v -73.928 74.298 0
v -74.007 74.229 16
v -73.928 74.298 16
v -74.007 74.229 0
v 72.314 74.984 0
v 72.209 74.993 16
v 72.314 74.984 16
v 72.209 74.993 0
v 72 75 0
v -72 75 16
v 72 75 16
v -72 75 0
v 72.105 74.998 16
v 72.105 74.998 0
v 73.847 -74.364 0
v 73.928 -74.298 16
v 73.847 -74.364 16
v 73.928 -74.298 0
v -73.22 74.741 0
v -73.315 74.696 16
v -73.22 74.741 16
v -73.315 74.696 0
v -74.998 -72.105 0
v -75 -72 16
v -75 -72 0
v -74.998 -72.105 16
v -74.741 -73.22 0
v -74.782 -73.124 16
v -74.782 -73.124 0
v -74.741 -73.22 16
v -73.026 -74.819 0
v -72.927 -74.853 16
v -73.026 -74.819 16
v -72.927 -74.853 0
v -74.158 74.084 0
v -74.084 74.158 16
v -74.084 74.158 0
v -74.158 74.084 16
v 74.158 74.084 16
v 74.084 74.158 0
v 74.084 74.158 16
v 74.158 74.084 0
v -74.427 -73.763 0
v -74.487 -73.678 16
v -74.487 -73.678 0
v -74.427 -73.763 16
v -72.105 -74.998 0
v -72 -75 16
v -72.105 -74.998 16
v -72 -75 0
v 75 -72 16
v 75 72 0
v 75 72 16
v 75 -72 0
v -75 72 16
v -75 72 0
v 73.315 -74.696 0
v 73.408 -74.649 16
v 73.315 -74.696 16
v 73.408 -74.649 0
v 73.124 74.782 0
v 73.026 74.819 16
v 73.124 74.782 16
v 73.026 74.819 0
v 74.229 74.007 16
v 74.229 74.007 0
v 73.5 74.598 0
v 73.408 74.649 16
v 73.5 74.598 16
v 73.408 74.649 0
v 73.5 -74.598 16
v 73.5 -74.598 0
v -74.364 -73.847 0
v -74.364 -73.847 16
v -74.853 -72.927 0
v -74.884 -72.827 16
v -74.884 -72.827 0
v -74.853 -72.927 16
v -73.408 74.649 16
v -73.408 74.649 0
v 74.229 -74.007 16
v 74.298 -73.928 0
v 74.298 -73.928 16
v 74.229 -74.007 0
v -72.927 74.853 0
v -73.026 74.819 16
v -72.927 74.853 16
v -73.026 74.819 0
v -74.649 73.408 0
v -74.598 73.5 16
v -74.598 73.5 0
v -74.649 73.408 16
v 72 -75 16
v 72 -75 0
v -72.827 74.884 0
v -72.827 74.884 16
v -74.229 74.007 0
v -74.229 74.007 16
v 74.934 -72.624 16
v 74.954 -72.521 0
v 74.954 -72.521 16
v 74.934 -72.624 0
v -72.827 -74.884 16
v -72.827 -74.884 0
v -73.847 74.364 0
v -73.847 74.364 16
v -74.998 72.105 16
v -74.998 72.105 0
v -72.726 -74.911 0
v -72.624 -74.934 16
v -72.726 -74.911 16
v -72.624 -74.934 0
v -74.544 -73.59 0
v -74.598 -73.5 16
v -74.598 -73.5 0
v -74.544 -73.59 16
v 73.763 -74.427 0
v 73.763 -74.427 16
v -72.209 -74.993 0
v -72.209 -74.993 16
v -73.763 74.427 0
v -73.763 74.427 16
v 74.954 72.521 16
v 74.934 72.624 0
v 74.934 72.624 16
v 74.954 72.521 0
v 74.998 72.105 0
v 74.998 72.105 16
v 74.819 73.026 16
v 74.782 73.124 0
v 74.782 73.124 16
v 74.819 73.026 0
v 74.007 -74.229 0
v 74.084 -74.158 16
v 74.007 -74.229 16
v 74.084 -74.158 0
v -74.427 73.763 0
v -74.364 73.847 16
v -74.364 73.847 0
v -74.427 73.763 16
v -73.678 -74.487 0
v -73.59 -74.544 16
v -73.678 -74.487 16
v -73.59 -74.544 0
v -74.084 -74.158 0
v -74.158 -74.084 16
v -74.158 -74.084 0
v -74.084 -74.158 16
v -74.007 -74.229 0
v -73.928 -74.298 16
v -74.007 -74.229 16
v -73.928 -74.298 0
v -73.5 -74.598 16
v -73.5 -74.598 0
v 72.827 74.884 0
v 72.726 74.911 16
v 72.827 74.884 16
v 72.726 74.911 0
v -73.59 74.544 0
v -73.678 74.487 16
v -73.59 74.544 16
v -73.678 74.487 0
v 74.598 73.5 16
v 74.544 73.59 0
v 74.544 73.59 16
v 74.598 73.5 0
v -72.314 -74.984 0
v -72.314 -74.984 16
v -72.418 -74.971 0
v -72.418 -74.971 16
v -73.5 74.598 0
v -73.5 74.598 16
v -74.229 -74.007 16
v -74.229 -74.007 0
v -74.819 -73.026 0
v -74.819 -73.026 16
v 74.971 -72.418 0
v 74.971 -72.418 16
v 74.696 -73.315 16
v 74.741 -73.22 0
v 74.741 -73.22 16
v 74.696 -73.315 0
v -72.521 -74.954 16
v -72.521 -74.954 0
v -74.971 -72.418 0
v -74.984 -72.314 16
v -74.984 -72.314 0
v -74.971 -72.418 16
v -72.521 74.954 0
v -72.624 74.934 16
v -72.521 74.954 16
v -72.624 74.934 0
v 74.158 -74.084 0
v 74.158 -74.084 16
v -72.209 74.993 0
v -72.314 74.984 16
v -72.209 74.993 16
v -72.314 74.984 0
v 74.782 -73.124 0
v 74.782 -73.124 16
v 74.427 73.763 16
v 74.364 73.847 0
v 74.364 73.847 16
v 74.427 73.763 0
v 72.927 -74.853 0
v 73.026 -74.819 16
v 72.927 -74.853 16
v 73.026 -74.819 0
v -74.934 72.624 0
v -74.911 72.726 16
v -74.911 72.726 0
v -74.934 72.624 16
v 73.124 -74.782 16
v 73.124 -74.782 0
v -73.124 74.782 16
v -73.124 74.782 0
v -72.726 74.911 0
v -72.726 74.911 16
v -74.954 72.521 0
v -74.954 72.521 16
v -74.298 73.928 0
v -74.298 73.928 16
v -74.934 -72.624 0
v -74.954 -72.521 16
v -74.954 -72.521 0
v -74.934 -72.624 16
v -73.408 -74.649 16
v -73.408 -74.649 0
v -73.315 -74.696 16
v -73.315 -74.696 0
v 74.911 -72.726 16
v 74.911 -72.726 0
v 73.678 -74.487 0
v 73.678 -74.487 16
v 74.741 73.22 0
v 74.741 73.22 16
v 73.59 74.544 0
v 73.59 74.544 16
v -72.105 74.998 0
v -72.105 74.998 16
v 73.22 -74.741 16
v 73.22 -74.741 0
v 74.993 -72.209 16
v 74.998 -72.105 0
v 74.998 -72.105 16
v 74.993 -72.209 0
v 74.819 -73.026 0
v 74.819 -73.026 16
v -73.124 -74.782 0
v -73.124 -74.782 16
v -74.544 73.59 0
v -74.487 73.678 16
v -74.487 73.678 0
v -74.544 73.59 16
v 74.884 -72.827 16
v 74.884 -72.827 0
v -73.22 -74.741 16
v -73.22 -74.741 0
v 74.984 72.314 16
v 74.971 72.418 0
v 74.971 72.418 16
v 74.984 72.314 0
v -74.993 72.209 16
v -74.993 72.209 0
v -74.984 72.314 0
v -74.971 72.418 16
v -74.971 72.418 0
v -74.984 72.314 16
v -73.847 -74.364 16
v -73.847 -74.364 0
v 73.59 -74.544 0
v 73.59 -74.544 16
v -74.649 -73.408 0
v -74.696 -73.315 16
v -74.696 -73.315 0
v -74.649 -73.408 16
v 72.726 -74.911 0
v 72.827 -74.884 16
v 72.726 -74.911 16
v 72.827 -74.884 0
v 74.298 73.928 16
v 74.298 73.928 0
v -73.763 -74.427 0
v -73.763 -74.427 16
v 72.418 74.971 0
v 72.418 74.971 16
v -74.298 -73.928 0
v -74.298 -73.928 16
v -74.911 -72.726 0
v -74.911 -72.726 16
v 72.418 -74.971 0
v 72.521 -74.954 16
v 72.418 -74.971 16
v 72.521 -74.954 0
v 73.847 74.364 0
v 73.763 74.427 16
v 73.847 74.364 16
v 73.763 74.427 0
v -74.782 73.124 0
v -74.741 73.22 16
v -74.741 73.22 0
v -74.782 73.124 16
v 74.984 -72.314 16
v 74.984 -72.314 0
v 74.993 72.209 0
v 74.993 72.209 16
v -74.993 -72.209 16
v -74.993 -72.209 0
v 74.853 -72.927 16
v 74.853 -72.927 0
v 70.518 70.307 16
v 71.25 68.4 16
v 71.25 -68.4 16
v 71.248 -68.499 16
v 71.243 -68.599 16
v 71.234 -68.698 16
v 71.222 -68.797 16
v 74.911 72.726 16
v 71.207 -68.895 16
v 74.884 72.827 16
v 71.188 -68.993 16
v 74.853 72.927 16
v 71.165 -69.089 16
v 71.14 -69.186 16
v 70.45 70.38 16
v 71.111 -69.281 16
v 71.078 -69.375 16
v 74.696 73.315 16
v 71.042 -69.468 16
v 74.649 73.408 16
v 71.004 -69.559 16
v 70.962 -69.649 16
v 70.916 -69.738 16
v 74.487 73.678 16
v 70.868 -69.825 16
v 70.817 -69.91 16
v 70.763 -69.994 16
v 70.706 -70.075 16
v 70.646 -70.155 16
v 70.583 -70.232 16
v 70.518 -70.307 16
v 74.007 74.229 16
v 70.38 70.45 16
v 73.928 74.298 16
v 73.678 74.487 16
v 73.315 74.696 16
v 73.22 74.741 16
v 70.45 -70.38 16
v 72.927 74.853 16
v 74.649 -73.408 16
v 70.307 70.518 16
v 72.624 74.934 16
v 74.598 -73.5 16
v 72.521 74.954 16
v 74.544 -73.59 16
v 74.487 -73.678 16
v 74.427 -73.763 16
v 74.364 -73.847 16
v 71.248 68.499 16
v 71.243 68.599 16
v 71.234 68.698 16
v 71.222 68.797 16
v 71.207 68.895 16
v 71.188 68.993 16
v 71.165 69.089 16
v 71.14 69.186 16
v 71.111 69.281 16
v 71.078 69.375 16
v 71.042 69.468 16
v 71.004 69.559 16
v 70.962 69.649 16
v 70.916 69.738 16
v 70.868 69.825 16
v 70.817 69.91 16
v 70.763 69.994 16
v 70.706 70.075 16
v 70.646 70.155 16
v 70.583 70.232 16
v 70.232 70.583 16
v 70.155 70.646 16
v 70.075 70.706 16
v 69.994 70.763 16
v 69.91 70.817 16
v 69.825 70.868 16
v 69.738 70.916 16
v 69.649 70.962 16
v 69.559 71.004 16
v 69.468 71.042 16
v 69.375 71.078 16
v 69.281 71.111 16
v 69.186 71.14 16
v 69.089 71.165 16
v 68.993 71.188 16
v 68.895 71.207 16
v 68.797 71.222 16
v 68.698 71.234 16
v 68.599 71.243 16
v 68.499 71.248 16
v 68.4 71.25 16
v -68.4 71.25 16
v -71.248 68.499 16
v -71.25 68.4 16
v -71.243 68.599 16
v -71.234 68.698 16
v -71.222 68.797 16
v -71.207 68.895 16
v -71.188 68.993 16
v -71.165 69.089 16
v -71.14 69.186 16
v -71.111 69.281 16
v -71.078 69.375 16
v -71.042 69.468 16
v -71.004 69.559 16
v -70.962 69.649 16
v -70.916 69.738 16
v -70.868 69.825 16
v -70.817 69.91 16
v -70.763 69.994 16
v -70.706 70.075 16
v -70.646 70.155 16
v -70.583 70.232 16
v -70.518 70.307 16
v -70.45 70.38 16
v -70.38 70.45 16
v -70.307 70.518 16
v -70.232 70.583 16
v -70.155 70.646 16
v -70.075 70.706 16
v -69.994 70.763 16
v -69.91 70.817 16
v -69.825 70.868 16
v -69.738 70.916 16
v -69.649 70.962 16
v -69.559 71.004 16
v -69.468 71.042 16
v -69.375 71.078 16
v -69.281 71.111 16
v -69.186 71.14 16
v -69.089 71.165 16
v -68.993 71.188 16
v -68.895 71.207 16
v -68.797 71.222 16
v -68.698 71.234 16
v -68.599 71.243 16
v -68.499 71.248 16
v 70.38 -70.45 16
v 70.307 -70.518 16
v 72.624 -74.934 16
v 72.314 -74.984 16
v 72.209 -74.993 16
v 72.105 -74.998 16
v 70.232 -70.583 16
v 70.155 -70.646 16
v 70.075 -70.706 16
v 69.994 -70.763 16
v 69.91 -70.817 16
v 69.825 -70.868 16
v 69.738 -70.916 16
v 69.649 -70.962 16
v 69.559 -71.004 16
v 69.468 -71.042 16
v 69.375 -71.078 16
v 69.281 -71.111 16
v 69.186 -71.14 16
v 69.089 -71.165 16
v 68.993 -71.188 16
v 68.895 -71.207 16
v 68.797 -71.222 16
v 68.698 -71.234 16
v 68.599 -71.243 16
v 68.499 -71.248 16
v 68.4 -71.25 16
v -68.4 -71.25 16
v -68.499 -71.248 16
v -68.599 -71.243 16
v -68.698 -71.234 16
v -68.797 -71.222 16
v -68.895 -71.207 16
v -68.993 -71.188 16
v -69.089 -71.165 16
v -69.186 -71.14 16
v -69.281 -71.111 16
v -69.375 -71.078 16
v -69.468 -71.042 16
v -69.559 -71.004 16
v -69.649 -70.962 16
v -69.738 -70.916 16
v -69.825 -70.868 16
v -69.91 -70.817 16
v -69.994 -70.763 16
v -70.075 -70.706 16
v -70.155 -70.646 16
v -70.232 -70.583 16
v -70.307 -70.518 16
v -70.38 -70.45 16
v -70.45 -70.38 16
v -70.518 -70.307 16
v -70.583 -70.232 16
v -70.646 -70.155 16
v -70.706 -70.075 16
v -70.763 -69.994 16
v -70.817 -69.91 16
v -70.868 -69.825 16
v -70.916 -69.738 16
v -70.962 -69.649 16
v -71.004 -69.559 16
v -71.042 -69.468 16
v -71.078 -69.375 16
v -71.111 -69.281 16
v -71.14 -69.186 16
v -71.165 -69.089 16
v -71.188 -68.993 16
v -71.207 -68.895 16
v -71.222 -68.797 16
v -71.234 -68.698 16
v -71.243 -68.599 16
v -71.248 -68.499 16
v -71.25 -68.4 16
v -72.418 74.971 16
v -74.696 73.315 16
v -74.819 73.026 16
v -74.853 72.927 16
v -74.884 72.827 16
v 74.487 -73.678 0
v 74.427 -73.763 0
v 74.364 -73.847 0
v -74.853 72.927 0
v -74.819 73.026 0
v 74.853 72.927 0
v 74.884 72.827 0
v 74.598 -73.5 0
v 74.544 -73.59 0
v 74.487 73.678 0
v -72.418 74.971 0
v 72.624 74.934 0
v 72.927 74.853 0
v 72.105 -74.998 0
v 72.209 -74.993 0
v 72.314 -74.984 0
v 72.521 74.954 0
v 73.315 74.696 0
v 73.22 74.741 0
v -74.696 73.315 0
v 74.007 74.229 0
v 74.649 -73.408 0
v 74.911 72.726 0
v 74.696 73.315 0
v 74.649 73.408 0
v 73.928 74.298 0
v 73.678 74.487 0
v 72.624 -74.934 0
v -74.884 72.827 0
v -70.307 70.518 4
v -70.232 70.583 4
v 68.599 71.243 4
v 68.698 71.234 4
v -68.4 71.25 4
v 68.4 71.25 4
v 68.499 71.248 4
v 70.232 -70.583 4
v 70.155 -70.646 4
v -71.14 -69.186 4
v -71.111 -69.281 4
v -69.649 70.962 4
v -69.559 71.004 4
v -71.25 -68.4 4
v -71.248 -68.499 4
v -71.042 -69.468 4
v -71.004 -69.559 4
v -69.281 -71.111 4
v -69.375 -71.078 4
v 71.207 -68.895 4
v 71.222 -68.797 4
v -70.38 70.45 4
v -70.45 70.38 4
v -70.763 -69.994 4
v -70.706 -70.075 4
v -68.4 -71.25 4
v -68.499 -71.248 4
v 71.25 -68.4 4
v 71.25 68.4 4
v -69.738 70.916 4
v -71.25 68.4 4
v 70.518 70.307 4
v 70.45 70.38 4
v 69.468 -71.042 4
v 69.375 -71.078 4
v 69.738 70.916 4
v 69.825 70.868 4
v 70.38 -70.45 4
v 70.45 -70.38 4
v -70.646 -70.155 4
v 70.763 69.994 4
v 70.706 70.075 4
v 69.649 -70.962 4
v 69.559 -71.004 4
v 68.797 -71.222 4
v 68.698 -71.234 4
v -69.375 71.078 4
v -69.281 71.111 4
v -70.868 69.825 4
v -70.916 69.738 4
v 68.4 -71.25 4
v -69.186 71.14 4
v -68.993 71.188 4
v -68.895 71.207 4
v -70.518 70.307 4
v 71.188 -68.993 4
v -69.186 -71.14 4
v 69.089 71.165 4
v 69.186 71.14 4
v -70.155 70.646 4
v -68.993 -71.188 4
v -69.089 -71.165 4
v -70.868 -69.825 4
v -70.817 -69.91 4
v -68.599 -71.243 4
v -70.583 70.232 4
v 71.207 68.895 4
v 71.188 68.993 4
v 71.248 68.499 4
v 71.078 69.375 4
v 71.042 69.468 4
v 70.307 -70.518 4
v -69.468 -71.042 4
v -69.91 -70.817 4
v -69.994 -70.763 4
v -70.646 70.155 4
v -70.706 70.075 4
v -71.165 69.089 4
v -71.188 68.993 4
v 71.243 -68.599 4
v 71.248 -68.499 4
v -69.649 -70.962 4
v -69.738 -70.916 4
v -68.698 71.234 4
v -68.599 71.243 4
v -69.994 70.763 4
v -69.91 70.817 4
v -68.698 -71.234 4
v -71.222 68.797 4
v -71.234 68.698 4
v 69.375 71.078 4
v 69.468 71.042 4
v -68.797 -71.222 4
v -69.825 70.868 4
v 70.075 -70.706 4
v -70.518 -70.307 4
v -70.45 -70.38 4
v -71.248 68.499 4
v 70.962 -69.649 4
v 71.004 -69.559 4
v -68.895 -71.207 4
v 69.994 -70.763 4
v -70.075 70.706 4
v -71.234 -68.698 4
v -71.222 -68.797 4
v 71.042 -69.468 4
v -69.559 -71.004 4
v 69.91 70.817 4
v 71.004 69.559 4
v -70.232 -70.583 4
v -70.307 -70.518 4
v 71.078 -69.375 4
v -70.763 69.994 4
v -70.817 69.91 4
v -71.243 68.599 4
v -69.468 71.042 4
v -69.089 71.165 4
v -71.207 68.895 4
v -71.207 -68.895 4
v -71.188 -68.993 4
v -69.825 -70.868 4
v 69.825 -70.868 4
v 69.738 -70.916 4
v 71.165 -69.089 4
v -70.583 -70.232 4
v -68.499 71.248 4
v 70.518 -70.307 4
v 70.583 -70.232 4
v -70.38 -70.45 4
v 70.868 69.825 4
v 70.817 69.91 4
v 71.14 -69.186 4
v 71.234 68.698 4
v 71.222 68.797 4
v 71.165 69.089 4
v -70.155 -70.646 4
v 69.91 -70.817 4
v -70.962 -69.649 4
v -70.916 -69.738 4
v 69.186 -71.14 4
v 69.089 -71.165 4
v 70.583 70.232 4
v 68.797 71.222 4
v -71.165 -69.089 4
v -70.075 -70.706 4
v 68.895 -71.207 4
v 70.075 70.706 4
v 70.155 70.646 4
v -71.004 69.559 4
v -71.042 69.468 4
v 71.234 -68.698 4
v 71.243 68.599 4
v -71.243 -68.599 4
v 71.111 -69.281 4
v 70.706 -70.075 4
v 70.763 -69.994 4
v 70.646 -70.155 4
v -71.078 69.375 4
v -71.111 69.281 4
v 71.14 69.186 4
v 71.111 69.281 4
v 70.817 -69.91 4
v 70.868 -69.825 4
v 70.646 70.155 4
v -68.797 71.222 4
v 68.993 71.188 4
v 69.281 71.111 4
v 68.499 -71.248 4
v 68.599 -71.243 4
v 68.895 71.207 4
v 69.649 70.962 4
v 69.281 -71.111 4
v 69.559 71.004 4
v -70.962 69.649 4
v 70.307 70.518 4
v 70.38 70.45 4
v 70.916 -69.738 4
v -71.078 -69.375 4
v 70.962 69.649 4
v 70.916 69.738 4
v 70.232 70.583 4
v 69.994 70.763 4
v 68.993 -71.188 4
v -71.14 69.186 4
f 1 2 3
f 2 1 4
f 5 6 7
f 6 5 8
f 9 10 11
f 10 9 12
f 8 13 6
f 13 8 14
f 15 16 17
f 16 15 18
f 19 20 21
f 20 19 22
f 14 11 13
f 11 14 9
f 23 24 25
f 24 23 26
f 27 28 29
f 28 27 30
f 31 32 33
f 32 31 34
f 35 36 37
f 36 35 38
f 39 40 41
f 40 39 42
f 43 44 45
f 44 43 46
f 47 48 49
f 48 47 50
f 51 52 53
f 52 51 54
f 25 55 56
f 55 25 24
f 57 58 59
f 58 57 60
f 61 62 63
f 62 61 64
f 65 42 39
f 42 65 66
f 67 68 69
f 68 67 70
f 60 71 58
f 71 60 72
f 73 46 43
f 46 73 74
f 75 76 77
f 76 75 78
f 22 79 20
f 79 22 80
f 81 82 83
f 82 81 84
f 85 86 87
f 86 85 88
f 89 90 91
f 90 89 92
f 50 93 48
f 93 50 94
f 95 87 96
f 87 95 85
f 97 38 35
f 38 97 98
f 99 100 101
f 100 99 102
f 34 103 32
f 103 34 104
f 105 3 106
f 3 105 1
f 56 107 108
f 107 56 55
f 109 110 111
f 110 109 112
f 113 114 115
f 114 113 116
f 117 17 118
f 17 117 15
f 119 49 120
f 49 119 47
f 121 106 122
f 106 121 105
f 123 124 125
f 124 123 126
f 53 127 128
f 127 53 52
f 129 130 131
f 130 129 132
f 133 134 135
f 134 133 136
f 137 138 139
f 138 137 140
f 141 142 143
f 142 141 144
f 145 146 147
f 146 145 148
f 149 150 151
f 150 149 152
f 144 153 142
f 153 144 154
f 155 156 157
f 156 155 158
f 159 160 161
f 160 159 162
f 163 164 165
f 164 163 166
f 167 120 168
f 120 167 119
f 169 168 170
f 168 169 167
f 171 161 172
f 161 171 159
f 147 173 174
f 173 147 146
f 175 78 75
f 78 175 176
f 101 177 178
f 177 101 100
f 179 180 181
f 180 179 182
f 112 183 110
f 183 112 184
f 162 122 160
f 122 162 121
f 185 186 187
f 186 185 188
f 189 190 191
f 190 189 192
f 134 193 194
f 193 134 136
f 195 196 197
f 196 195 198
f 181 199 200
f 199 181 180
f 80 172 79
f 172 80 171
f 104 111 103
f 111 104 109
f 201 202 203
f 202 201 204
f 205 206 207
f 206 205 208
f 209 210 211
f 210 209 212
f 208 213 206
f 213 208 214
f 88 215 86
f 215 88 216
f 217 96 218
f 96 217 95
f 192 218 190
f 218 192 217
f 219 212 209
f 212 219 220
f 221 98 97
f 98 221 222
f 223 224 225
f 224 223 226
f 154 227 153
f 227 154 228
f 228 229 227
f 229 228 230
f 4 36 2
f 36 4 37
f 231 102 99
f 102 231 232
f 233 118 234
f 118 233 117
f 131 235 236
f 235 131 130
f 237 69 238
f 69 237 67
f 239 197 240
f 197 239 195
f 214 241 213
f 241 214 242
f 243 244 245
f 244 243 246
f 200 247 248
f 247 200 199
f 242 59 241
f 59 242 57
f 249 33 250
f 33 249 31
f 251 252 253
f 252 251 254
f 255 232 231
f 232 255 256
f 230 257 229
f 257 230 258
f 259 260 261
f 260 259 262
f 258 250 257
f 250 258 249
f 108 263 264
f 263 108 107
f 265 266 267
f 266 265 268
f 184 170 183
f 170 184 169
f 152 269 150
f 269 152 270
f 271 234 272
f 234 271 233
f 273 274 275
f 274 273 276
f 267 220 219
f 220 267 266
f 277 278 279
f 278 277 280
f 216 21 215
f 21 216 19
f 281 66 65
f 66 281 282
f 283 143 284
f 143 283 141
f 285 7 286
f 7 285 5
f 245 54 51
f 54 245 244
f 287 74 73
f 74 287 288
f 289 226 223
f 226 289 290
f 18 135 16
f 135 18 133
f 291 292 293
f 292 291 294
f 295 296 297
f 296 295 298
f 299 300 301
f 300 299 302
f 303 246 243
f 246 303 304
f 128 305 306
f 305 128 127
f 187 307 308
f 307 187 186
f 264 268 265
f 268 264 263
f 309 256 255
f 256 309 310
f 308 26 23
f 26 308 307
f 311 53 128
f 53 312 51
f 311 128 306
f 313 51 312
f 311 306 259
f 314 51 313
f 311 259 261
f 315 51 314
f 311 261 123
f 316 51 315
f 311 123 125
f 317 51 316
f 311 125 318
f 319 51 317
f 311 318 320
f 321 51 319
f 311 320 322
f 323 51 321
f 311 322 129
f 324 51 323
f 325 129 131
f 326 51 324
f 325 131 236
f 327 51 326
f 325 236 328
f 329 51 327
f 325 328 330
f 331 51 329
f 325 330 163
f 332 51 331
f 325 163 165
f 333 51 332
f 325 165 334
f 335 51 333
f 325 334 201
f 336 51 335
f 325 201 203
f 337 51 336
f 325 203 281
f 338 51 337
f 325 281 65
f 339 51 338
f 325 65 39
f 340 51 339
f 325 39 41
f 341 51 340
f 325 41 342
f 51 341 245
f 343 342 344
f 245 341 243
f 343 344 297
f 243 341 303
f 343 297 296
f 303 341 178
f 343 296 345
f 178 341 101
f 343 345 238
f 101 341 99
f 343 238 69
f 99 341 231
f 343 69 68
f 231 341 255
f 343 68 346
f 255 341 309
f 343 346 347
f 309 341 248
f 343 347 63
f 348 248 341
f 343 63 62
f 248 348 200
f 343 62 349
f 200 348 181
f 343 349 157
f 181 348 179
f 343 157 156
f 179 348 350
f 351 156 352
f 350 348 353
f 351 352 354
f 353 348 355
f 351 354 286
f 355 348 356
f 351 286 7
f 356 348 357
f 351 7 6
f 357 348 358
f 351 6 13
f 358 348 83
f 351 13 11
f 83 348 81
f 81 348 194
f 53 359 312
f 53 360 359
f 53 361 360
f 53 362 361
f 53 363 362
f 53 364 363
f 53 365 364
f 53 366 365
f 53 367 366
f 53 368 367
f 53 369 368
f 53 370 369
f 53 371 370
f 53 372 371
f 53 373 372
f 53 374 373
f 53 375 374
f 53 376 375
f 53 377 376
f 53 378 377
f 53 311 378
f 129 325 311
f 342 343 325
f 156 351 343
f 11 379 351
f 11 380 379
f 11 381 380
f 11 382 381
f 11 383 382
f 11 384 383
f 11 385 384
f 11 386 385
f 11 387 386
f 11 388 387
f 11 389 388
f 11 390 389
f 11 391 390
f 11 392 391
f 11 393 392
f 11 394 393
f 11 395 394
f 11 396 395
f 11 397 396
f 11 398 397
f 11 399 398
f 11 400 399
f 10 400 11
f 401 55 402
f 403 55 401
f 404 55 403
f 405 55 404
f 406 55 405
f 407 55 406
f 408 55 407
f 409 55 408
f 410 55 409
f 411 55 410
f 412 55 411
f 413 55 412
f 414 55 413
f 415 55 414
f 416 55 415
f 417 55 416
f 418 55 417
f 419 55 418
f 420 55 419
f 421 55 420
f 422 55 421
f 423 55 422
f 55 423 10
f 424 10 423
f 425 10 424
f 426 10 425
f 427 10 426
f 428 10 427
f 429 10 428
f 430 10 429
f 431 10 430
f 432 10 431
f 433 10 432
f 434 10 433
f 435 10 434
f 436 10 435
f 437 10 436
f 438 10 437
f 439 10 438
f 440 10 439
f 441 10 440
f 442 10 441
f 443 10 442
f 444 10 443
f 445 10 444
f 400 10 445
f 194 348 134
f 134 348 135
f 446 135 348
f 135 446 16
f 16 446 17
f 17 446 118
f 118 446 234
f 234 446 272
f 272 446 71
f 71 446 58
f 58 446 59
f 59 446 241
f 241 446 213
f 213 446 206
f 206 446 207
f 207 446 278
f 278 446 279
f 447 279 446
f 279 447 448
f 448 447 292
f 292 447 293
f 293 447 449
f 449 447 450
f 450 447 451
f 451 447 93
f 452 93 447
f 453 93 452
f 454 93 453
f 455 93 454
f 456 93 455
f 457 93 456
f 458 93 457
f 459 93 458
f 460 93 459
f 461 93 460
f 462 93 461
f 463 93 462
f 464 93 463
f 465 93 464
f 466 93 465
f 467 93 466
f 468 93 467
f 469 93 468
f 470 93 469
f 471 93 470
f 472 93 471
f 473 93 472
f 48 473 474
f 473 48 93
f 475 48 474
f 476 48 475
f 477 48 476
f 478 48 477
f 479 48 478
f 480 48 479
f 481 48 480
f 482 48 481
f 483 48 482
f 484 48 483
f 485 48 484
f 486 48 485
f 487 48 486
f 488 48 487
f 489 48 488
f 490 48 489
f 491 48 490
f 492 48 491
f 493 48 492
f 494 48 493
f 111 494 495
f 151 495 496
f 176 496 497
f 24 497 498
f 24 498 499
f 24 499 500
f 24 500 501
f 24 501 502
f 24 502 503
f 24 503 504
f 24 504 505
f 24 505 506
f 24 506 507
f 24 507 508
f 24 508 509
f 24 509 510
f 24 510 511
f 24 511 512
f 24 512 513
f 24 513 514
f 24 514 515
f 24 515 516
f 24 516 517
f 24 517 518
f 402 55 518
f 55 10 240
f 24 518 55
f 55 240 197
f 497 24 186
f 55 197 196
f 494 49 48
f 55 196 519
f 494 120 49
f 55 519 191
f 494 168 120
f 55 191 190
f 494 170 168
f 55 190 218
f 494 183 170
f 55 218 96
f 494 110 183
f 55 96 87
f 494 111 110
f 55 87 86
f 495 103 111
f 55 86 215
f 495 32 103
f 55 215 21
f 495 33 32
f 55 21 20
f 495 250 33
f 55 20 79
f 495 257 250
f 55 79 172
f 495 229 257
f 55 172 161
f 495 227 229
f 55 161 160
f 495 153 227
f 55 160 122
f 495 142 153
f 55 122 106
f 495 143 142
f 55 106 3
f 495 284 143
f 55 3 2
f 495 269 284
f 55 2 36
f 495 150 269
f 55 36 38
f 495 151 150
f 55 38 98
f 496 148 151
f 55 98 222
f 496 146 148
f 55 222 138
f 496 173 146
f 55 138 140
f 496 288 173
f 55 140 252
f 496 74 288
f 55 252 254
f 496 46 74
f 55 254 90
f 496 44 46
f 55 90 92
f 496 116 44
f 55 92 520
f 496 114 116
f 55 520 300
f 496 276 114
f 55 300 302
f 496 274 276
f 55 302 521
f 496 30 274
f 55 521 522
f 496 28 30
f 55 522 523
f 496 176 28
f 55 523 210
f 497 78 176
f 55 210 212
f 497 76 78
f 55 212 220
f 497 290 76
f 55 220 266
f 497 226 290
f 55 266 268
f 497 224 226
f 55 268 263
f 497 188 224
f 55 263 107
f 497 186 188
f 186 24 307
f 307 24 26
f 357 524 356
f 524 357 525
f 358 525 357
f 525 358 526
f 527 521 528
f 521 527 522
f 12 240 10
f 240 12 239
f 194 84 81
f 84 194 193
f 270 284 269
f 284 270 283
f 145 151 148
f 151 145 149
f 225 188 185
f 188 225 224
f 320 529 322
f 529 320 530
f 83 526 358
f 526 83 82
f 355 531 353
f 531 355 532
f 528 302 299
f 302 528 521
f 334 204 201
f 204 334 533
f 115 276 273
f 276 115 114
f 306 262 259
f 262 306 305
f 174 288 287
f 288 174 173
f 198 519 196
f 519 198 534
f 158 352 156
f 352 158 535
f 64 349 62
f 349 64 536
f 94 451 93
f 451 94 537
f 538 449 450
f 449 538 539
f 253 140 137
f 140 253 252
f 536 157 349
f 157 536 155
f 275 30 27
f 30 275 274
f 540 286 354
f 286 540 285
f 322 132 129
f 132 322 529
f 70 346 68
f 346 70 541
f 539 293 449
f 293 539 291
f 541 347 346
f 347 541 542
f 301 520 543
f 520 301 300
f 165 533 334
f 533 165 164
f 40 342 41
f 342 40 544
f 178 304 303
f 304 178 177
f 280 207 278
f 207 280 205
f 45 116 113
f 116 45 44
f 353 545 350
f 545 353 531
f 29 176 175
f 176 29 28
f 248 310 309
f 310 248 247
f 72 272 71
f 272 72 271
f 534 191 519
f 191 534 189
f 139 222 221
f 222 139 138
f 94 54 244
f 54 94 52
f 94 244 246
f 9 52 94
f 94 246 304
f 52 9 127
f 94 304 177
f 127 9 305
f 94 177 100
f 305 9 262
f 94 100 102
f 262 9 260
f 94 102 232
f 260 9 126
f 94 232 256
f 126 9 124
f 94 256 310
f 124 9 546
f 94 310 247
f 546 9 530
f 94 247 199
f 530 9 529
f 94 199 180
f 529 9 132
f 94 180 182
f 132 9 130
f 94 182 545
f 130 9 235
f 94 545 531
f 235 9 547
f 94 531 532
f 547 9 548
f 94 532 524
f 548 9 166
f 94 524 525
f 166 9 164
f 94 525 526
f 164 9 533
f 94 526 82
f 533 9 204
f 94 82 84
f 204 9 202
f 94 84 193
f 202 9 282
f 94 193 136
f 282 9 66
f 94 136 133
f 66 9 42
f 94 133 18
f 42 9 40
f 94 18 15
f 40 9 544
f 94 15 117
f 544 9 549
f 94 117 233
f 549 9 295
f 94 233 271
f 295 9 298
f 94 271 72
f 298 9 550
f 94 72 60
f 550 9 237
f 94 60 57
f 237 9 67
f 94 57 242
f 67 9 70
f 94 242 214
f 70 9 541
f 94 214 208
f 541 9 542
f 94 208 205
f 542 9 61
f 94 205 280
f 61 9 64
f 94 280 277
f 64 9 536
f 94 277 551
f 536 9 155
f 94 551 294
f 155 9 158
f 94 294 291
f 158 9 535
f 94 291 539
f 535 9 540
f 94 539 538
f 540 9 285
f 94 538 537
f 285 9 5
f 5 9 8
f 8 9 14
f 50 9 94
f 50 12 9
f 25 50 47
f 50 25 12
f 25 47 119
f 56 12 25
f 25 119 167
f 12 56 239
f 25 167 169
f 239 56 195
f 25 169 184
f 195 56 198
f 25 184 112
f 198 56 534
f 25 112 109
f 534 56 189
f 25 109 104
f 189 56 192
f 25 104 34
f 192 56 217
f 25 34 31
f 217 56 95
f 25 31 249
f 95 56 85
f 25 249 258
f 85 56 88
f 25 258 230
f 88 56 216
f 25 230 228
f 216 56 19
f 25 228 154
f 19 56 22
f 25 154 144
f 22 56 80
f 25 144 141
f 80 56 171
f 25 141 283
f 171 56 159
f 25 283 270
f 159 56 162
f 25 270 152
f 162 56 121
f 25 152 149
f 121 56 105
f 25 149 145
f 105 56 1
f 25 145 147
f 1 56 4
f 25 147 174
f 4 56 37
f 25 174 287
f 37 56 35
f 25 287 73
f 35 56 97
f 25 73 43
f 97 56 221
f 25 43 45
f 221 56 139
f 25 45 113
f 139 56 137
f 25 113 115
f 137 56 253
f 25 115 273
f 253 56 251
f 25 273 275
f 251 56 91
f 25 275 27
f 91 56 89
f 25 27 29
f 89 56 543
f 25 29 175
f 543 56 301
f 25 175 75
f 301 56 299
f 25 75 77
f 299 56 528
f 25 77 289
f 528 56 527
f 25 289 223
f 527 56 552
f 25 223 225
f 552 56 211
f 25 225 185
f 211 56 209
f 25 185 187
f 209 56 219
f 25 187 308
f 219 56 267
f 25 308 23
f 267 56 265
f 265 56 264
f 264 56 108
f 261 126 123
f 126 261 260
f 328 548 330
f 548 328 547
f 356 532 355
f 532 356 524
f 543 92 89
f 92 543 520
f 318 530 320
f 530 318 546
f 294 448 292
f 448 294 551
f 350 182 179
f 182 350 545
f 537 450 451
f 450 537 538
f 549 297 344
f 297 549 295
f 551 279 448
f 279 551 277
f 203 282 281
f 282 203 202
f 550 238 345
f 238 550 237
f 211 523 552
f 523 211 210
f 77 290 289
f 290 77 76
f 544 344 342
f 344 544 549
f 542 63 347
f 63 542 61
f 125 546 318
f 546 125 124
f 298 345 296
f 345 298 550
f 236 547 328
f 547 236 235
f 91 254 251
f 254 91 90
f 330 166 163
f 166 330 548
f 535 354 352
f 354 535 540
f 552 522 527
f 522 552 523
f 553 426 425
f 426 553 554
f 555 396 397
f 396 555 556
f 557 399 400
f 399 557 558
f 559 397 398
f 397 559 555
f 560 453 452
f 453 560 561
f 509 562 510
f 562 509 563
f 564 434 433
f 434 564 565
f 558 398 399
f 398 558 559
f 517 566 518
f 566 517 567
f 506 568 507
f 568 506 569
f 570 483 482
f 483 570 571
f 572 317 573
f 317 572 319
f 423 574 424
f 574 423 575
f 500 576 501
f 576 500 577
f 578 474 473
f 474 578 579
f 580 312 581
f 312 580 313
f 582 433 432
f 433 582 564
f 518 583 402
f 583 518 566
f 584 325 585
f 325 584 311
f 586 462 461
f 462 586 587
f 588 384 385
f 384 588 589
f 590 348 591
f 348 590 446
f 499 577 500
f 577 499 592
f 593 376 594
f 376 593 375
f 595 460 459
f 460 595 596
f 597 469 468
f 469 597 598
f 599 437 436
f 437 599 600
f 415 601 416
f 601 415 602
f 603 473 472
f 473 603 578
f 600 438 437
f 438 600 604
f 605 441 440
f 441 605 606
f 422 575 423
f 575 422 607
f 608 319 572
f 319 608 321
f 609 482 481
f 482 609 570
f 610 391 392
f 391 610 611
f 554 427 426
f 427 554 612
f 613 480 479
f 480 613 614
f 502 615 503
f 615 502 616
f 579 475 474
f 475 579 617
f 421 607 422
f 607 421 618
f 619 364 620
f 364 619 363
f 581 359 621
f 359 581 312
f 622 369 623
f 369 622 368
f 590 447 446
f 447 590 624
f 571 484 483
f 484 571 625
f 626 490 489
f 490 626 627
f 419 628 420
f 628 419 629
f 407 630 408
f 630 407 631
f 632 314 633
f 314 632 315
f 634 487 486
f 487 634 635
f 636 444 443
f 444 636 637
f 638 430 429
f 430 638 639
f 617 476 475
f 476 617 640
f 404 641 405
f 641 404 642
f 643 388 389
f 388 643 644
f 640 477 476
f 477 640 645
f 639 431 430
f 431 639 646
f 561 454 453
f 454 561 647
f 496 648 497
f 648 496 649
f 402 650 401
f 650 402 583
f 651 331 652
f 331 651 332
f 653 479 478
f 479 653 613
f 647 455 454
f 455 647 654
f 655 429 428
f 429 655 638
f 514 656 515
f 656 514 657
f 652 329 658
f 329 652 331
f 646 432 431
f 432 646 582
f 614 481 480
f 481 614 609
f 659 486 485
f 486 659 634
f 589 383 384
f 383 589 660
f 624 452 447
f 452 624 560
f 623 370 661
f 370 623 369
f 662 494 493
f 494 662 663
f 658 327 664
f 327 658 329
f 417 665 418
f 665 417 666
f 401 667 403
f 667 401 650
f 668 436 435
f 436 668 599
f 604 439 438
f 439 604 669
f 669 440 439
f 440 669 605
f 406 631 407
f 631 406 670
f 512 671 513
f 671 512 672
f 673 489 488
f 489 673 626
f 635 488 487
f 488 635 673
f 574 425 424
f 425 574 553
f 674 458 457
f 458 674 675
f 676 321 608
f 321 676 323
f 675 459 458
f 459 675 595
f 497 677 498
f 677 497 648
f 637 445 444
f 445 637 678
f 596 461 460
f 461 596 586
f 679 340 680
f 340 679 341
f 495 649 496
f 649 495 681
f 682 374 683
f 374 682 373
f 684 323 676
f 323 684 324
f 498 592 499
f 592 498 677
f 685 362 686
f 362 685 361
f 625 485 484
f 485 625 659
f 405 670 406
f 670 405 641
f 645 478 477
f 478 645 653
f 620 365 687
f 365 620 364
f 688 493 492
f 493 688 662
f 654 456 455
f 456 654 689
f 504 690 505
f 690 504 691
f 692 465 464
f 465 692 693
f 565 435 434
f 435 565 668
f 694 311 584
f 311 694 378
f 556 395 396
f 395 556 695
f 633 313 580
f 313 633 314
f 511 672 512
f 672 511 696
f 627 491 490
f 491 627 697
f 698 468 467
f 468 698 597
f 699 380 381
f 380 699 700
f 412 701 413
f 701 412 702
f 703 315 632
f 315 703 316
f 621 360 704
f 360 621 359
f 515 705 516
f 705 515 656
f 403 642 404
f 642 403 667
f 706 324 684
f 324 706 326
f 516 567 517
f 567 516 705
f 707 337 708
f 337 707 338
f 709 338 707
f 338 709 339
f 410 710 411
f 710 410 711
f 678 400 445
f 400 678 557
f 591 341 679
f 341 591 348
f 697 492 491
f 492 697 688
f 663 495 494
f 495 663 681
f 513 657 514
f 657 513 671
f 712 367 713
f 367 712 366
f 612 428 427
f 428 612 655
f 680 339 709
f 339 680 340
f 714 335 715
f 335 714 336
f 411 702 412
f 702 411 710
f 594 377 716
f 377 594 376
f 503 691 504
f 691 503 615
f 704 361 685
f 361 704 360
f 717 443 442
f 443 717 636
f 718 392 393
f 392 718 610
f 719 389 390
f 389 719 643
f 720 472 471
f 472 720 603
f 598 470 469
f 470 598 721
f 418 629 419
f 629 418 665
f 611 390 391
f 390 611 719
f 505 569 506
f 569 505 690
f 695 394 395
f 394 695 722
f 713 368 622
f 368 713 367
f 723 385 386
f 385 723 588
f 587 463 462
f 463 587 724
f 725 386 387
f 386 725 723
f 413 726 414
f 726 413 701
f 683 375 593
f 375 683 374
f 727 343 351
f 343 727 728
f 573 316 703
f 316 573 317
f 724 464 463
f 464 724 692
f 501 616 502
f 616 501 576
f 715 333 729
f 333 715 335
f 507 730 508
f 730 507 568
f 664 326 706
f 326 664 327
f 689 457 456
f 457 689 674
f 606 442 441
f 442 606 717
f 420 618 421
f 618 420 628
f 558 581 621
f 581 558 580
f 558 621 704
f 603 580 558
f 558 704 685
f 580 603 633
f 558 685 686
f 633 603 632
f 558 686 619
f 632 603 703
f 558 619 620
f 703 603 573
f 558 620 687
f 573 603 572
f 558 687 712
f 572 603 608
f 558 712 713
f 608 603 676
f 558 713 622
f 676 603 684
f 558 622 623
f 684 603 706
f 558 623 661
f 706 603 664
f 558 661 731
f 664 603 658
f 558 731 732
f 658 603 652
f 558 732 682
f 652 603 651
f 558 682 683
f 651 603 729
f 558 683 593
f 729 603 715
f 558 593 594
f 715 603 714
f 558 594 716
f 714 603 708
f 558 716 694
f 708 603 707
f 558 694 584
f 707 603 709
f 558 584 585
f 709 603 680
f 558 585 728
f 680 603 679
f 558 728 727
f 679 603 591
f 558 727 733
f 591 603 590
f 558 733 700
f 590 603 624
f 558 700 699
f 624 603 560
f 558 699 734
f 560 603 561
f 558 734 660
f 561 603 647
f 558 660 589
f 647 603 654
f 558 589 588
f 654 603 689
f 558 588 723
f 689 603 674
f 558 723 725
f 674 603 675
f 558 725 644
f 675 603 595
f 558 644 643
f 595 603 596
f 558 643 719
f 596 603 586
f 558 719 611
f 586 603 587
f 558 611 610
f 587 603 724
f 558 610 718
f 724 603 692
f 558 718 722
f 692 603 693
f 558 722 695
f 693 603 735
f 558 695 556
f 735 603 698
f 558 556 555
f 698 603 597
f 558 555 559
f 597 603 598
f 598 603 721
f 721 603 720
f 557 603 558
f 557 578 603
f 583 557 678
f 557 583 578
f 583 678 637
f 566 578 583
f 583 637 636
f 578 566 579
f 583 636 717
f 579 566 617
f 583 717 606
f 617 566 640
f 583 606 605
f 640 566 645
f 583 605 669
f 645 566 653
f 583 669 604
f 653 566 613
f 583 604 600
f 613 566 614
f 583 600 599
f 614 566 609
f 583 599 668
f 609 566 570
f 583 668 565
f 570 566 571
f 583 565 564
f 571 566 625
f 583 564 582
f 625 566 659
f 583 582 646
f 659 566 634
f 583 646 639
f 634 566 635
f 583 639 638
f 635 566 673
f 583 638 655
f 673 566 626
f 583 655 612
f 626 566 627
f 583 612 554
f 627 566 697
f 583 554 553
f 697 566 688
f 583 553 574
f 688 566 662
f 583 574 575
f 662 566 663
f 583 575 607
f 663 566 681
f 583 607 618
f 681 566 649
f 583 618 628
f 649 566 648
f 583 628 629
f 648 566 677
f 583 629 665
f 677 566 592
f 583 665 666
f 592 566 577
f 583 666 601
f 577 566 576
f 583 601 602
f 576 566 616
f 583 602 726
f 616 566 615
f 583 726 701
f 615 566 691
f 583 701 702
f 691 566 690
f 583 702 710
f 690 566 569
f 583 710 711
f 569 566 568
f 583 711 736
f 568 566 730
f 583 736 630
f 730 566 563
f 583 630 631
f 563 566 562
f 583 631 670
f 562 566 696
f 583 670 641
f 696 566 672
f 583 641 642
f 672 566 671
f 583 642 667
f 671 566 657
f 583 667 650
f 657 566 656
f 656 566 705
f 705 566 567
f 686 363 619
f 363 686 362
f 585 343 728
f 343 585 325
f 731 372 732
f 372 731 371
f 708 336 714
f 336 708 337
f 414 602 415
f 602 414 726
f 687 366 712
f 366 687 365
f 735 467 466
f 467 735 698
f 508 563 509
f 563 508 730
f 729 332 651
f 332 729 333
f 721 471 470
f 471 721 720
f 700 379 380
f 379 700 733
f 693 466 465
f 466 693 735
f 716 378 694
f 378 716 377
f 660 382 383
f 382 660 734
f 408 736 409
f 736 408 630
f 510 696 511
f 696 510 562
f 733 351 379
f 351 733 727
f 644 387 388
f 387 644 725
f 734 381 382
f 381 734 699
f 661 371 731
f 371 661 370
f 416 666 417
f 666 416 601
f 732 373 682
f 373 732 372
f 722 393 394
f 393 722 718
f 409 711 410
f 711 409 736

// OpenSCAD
$fs=0.1;
$fa=2;

rounding = 3;

butterstick_dims = [
    121+9, // l
    121+9, // w
    16     // h (=w)
];

butterdish_bottom_dims = [
    butterstick_dims[0]+20, // l
    butterstick_dims[1]+20, // w
    5.0 // h
];

module wantRect(l, w) {
    translate([-l/2,-w/2,0])
        square([l, w]);
}

module wantCirc(s) {
    circle(d=s,$fn=60);
}

rim_len = (butterstick_dims[0]+butterdish_bottom_dims[0])/2;
rim_wid = (butterstick_dims[1]+butterdish_bottom_dims[1])/2;
module butterdish_bottom2D() {
    #wantRect(butterstick_dims[0], butterstick_dims[1]); // Stick loc
    #offset(r=rounding) offset(r=-rounding)
    wantRect(rim_len, rim_wid); // Rim loc
    offset(r=rounding) offset(r=-rounding)
    wantRect(butterdish_bottom_dims[0], butterdish_bottom_dims[1]); // Dish edge
}


module butterdish_final() {
    linear_extrude(butterstick_dims[2])
    butterdish_bottom2D();
}

module soapdish_final() {
difference() {
butterdish_final();

linear_extrude(butterstick_dims[2]-4)
scale(0.95)
butterdish_bottom2D();
}
}

translate([0, 0, butterstick_dims[2]])
rotate([180, 0, 0])
soapdish_final();
